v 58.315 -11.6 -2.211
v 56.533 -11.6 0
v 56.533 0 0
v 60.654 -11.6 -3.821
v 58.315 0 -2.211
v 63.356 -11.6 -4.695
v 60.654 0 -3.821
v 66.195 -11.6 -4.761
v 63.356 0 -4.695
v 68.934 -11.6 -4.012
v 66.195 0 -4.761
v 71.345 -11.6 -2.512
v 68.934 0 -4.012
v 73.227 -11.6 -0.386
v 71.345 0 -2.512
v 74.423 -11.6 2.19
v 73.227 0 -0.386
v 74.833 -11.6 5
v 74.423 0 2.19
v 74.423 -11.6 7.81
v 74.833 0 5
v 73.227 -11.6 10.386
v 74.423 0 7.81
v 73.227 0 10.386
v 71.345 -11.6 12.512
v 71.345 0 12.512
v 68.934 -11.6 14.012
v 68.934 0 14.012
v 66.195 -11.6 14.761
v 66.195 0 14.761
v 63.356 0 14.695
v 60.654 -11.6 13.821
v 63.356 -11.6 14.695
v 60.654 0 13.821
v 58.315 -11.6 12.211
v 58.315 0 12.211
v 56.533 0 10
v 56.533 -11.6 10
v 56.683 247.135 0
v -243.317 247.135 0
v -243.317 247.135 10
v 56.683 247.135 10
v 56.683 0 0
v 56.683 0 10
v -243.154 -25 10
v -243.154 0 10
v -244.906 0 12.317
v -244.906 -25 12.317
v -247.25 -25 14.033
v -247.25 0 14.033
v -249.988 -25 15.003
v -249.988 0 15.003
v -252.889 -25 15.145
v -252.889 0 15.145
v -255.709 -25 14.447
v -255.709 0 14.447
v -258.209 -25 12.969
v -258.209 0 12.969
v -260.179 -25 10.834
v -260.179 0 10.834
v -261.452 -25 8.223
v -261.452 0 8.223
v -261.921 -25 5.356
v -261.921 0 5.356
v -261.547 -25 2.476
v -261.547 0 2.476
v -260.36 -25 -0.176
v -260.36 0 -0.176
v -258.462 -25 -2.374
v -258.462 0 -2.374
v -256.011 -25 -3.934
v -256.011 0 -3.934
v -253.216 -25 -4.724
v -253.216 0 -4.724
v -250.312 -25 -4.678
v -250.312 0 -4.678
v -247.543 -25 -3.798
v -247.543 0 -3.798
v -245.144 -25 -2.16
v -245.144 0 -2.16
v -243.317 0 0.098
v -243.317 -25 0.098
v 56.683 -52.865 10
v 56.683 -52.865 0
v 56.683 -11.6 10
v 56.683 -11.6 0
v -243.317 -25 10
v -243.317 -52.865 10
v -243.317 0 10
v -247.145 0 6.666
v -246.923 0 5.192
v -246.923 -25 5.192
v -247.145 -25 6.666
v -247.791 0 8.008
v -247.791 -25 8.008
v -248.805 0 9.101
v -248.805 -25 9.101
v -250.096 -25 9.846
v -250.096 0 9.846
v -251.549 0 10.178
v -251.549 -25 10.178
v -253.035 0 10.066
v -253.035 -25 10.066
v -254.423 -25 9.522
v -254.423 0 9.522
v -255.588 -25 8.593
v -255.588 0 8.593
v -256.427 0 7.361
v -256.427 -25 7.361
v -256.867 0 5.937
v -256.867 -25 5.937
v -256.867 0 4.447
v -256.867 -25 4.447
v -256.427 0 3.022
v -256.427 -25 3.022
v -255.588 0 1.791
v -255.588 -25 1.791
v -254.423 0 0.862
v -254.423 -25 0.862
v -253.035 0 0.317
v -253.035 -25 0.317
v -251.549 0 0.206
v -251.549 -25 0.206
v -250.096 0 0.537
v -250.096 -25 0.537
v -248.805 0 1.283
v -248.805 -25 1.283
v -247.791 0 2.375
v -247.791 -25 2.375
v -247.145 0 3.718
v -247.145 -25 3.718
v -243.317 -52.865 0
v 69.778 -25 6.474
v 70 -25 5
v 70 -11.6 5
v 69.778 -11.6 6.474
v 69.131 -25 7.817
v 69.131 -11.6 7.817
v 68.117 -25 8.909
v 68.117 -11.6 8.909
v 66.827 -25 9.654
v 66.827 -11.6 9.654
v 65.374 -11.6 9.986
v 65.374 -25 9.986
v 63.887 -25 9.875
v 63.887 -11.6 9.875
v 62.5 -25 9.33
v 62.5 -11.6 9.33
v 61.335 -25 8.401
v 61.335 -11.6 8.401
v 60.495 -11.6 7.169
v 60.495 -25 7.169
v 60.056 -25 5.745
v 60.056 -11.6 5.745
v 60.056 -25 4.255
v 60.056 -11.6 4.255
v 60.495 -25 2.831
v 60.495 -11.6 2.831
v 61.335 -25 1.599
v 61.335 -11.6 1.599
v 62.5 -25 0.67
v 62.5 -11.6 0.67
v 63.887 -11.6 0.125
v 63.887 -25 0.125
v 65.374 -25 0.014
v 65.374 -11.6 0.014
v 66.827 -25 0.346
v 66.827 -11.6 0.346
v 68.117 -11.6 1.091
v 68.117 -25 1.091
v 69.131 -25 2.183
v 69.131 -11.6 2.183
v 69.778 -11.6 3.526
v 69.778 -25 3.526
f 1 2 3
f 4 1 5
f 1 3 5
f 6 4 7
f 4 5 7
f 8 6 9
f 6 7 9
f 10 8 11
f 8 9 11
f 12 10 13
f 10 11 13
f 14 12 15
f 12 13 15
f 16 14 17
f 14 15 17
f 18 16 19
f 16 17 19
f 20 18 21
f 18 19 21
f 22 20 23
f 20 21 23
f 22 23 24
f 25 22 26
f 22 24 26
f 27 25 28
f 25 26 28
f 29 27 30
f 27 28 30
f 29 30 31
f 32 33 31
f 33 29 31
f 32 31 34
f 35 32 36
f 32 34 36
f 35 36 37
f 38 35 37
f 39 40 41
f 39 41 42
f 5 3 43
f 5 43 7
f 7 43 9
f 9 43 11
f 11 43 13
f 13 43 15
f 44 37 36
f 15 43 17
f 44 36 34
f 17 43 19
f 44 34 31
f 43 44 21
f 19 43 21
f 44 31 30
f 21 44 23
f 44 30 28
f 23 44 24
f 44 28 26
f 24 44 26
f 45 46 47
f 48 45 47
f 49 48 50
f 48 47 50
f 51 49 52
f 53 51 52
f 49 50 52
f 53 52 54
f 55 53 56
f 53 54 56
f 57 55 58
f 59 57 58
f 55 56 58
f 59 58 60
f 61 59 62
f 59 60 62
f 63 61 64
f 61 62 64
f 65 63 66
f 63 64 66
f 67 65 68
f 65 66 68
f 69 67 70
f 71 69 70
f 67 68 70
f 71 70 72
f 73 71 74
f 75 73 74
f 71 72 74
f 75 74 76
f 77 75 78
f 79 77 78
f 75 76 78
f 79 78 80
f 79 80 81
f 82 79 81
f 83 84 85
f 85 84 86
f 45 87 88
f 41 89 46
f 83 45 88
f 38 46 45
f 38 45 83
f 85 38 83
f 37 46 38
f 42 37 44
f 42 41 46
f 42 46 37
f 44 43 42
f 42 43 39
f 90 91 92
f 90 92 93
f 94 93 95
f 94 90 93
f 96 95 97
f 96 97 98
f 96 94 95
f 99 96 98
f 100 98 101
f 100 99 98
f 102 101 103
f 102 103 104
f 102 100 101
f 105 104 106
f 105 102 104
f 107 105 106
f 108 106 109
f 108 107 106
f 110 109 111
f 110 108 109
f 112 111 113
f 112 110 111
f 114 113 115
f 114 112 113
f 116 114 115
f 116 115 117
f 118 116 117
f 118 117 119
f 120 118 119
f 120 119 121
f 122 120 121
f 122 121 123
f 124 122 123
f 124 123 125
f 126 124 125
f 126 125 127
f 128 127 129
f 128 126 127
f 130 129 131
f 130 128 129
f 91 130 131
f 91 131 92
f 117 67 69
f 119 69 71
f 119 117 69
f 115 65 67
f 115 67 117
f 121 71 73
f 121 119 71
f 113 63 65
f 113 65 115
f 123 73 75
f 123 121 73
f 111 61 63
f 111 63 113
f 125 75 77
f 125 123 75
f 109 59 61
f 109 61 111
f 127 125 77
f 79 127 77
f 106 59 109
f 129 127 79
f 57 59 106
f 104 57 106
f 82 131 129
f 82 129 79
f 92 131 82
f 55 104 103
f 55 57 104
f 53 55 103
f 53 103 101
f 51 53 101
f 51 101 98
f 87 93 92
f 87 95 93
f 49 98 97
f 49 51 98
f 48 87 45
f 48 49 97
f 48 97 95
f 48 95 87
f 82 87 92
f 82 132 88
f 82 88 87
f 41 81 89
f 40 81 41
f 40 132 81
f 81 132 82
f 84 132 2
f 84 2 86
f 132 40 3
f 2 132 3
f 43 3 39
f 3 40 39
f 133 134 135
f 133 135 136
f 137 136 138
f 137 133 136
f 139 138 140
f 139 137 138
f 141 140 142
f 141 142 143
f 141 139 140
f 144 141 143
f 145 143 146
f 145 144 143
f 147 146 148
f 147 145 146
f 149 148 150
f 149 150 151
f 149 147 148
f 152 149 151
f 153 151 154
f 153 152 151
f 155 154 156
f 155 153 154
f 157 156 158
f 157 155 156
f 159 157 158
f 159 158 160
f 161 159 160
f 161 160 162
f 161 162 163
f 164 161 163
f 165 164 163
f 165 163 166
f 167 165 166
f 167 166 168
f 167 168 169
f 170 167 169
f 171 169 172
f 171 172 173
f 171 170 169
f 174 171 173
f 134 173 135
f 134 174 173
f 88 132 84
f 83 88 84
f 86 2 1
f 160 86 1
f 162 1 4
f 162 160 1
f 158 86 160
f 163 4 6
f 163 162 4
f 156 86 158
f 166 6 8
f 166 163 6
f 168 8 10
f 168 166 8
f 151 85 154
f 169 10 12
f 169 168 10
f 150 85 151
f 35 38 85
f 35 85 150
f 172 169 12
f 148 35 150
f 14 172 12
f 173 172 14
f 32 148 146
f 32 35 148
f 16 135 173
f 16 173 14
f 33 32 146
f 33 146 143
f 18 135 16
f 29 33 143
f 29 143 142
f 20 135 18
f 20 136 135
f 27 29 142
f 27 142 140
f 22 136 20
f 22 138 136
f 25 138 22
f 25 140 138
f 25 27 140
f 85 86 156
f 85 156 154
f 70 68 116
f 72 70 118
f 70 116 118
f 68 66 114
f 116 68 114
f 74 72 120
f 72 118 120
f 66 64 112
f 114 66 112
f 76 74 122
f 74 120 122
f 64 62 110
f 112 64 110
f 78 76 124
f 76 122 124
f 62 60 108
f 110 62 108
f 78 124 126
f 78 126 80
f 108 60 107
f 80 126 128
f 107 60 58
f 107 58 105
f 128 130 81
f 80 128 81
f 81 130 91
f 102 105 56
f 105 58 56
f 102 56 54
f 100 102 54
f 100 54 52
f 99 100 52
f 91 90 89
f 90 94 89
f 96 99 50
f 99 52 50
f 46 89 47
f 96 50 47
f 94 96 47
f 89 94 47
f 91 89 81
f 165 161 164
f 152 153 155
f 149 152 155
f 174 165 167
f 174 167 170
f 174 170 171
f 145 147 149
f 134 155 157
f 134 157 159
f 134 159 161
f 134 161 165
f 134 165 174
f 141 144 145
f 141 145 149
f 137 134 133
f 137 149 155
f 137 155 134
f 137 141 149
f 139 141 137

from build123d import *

# Parameters (mm, degrees)
F0_W     = 300
F0_H     = 300
F1_DEPTH = 10
F2_R     = 10
F2_R_2   = 5
F2_R_3   = 9.83343
F3_DEPTH = 25
F4_R     = 5
F5_DEPTH = 13.4


with BuildPart() as f1:
    # F0 (on Top) → F1 (new body)
    with BuildSketch(Plane.XY):
        with Locations((-93.317212, 97.135217)):
            Rectangle(F0_W, F0_H)
    extrude(amount=F1_DEPTH)

    # F2 (on Front) → F3 (join)
    with BuildSketch(Plane.XZ):
        with Locations((-251.922578, 5.191812)):
            Circle(F2_R)
        with Locations((-251.922578, 5.191812)):
            Circle(F2_R_2, mode=Mode.SUBTRACT)
        with Locations((64.999998, 5)):
            Circle(F2_R_3)
    extrude(amount=F3_DEPTH)

    # F4 (on face) → F5 (cut)
    with BuildSketch(Plane.XZ.offset(25)):
        with BuildLine():
            Line((56.682788, 10), (56.682788, 0))
            Line((56.682788, 0), (56.532628, 0))
            ThreePointArc((56.532628, 0), (74.833428, 5.000001), (56.532628, 10))
            Line((56.532628, 10), (56.682788, 10))
        make_face()
        with Locations((64.999998, 5)):
            Circle(F4_R, mode=Mode.SUBTRACT)
    extrude(amount=-F5_DEPTH, mode=Mode.SUBTRACT)


solid = f1.part
